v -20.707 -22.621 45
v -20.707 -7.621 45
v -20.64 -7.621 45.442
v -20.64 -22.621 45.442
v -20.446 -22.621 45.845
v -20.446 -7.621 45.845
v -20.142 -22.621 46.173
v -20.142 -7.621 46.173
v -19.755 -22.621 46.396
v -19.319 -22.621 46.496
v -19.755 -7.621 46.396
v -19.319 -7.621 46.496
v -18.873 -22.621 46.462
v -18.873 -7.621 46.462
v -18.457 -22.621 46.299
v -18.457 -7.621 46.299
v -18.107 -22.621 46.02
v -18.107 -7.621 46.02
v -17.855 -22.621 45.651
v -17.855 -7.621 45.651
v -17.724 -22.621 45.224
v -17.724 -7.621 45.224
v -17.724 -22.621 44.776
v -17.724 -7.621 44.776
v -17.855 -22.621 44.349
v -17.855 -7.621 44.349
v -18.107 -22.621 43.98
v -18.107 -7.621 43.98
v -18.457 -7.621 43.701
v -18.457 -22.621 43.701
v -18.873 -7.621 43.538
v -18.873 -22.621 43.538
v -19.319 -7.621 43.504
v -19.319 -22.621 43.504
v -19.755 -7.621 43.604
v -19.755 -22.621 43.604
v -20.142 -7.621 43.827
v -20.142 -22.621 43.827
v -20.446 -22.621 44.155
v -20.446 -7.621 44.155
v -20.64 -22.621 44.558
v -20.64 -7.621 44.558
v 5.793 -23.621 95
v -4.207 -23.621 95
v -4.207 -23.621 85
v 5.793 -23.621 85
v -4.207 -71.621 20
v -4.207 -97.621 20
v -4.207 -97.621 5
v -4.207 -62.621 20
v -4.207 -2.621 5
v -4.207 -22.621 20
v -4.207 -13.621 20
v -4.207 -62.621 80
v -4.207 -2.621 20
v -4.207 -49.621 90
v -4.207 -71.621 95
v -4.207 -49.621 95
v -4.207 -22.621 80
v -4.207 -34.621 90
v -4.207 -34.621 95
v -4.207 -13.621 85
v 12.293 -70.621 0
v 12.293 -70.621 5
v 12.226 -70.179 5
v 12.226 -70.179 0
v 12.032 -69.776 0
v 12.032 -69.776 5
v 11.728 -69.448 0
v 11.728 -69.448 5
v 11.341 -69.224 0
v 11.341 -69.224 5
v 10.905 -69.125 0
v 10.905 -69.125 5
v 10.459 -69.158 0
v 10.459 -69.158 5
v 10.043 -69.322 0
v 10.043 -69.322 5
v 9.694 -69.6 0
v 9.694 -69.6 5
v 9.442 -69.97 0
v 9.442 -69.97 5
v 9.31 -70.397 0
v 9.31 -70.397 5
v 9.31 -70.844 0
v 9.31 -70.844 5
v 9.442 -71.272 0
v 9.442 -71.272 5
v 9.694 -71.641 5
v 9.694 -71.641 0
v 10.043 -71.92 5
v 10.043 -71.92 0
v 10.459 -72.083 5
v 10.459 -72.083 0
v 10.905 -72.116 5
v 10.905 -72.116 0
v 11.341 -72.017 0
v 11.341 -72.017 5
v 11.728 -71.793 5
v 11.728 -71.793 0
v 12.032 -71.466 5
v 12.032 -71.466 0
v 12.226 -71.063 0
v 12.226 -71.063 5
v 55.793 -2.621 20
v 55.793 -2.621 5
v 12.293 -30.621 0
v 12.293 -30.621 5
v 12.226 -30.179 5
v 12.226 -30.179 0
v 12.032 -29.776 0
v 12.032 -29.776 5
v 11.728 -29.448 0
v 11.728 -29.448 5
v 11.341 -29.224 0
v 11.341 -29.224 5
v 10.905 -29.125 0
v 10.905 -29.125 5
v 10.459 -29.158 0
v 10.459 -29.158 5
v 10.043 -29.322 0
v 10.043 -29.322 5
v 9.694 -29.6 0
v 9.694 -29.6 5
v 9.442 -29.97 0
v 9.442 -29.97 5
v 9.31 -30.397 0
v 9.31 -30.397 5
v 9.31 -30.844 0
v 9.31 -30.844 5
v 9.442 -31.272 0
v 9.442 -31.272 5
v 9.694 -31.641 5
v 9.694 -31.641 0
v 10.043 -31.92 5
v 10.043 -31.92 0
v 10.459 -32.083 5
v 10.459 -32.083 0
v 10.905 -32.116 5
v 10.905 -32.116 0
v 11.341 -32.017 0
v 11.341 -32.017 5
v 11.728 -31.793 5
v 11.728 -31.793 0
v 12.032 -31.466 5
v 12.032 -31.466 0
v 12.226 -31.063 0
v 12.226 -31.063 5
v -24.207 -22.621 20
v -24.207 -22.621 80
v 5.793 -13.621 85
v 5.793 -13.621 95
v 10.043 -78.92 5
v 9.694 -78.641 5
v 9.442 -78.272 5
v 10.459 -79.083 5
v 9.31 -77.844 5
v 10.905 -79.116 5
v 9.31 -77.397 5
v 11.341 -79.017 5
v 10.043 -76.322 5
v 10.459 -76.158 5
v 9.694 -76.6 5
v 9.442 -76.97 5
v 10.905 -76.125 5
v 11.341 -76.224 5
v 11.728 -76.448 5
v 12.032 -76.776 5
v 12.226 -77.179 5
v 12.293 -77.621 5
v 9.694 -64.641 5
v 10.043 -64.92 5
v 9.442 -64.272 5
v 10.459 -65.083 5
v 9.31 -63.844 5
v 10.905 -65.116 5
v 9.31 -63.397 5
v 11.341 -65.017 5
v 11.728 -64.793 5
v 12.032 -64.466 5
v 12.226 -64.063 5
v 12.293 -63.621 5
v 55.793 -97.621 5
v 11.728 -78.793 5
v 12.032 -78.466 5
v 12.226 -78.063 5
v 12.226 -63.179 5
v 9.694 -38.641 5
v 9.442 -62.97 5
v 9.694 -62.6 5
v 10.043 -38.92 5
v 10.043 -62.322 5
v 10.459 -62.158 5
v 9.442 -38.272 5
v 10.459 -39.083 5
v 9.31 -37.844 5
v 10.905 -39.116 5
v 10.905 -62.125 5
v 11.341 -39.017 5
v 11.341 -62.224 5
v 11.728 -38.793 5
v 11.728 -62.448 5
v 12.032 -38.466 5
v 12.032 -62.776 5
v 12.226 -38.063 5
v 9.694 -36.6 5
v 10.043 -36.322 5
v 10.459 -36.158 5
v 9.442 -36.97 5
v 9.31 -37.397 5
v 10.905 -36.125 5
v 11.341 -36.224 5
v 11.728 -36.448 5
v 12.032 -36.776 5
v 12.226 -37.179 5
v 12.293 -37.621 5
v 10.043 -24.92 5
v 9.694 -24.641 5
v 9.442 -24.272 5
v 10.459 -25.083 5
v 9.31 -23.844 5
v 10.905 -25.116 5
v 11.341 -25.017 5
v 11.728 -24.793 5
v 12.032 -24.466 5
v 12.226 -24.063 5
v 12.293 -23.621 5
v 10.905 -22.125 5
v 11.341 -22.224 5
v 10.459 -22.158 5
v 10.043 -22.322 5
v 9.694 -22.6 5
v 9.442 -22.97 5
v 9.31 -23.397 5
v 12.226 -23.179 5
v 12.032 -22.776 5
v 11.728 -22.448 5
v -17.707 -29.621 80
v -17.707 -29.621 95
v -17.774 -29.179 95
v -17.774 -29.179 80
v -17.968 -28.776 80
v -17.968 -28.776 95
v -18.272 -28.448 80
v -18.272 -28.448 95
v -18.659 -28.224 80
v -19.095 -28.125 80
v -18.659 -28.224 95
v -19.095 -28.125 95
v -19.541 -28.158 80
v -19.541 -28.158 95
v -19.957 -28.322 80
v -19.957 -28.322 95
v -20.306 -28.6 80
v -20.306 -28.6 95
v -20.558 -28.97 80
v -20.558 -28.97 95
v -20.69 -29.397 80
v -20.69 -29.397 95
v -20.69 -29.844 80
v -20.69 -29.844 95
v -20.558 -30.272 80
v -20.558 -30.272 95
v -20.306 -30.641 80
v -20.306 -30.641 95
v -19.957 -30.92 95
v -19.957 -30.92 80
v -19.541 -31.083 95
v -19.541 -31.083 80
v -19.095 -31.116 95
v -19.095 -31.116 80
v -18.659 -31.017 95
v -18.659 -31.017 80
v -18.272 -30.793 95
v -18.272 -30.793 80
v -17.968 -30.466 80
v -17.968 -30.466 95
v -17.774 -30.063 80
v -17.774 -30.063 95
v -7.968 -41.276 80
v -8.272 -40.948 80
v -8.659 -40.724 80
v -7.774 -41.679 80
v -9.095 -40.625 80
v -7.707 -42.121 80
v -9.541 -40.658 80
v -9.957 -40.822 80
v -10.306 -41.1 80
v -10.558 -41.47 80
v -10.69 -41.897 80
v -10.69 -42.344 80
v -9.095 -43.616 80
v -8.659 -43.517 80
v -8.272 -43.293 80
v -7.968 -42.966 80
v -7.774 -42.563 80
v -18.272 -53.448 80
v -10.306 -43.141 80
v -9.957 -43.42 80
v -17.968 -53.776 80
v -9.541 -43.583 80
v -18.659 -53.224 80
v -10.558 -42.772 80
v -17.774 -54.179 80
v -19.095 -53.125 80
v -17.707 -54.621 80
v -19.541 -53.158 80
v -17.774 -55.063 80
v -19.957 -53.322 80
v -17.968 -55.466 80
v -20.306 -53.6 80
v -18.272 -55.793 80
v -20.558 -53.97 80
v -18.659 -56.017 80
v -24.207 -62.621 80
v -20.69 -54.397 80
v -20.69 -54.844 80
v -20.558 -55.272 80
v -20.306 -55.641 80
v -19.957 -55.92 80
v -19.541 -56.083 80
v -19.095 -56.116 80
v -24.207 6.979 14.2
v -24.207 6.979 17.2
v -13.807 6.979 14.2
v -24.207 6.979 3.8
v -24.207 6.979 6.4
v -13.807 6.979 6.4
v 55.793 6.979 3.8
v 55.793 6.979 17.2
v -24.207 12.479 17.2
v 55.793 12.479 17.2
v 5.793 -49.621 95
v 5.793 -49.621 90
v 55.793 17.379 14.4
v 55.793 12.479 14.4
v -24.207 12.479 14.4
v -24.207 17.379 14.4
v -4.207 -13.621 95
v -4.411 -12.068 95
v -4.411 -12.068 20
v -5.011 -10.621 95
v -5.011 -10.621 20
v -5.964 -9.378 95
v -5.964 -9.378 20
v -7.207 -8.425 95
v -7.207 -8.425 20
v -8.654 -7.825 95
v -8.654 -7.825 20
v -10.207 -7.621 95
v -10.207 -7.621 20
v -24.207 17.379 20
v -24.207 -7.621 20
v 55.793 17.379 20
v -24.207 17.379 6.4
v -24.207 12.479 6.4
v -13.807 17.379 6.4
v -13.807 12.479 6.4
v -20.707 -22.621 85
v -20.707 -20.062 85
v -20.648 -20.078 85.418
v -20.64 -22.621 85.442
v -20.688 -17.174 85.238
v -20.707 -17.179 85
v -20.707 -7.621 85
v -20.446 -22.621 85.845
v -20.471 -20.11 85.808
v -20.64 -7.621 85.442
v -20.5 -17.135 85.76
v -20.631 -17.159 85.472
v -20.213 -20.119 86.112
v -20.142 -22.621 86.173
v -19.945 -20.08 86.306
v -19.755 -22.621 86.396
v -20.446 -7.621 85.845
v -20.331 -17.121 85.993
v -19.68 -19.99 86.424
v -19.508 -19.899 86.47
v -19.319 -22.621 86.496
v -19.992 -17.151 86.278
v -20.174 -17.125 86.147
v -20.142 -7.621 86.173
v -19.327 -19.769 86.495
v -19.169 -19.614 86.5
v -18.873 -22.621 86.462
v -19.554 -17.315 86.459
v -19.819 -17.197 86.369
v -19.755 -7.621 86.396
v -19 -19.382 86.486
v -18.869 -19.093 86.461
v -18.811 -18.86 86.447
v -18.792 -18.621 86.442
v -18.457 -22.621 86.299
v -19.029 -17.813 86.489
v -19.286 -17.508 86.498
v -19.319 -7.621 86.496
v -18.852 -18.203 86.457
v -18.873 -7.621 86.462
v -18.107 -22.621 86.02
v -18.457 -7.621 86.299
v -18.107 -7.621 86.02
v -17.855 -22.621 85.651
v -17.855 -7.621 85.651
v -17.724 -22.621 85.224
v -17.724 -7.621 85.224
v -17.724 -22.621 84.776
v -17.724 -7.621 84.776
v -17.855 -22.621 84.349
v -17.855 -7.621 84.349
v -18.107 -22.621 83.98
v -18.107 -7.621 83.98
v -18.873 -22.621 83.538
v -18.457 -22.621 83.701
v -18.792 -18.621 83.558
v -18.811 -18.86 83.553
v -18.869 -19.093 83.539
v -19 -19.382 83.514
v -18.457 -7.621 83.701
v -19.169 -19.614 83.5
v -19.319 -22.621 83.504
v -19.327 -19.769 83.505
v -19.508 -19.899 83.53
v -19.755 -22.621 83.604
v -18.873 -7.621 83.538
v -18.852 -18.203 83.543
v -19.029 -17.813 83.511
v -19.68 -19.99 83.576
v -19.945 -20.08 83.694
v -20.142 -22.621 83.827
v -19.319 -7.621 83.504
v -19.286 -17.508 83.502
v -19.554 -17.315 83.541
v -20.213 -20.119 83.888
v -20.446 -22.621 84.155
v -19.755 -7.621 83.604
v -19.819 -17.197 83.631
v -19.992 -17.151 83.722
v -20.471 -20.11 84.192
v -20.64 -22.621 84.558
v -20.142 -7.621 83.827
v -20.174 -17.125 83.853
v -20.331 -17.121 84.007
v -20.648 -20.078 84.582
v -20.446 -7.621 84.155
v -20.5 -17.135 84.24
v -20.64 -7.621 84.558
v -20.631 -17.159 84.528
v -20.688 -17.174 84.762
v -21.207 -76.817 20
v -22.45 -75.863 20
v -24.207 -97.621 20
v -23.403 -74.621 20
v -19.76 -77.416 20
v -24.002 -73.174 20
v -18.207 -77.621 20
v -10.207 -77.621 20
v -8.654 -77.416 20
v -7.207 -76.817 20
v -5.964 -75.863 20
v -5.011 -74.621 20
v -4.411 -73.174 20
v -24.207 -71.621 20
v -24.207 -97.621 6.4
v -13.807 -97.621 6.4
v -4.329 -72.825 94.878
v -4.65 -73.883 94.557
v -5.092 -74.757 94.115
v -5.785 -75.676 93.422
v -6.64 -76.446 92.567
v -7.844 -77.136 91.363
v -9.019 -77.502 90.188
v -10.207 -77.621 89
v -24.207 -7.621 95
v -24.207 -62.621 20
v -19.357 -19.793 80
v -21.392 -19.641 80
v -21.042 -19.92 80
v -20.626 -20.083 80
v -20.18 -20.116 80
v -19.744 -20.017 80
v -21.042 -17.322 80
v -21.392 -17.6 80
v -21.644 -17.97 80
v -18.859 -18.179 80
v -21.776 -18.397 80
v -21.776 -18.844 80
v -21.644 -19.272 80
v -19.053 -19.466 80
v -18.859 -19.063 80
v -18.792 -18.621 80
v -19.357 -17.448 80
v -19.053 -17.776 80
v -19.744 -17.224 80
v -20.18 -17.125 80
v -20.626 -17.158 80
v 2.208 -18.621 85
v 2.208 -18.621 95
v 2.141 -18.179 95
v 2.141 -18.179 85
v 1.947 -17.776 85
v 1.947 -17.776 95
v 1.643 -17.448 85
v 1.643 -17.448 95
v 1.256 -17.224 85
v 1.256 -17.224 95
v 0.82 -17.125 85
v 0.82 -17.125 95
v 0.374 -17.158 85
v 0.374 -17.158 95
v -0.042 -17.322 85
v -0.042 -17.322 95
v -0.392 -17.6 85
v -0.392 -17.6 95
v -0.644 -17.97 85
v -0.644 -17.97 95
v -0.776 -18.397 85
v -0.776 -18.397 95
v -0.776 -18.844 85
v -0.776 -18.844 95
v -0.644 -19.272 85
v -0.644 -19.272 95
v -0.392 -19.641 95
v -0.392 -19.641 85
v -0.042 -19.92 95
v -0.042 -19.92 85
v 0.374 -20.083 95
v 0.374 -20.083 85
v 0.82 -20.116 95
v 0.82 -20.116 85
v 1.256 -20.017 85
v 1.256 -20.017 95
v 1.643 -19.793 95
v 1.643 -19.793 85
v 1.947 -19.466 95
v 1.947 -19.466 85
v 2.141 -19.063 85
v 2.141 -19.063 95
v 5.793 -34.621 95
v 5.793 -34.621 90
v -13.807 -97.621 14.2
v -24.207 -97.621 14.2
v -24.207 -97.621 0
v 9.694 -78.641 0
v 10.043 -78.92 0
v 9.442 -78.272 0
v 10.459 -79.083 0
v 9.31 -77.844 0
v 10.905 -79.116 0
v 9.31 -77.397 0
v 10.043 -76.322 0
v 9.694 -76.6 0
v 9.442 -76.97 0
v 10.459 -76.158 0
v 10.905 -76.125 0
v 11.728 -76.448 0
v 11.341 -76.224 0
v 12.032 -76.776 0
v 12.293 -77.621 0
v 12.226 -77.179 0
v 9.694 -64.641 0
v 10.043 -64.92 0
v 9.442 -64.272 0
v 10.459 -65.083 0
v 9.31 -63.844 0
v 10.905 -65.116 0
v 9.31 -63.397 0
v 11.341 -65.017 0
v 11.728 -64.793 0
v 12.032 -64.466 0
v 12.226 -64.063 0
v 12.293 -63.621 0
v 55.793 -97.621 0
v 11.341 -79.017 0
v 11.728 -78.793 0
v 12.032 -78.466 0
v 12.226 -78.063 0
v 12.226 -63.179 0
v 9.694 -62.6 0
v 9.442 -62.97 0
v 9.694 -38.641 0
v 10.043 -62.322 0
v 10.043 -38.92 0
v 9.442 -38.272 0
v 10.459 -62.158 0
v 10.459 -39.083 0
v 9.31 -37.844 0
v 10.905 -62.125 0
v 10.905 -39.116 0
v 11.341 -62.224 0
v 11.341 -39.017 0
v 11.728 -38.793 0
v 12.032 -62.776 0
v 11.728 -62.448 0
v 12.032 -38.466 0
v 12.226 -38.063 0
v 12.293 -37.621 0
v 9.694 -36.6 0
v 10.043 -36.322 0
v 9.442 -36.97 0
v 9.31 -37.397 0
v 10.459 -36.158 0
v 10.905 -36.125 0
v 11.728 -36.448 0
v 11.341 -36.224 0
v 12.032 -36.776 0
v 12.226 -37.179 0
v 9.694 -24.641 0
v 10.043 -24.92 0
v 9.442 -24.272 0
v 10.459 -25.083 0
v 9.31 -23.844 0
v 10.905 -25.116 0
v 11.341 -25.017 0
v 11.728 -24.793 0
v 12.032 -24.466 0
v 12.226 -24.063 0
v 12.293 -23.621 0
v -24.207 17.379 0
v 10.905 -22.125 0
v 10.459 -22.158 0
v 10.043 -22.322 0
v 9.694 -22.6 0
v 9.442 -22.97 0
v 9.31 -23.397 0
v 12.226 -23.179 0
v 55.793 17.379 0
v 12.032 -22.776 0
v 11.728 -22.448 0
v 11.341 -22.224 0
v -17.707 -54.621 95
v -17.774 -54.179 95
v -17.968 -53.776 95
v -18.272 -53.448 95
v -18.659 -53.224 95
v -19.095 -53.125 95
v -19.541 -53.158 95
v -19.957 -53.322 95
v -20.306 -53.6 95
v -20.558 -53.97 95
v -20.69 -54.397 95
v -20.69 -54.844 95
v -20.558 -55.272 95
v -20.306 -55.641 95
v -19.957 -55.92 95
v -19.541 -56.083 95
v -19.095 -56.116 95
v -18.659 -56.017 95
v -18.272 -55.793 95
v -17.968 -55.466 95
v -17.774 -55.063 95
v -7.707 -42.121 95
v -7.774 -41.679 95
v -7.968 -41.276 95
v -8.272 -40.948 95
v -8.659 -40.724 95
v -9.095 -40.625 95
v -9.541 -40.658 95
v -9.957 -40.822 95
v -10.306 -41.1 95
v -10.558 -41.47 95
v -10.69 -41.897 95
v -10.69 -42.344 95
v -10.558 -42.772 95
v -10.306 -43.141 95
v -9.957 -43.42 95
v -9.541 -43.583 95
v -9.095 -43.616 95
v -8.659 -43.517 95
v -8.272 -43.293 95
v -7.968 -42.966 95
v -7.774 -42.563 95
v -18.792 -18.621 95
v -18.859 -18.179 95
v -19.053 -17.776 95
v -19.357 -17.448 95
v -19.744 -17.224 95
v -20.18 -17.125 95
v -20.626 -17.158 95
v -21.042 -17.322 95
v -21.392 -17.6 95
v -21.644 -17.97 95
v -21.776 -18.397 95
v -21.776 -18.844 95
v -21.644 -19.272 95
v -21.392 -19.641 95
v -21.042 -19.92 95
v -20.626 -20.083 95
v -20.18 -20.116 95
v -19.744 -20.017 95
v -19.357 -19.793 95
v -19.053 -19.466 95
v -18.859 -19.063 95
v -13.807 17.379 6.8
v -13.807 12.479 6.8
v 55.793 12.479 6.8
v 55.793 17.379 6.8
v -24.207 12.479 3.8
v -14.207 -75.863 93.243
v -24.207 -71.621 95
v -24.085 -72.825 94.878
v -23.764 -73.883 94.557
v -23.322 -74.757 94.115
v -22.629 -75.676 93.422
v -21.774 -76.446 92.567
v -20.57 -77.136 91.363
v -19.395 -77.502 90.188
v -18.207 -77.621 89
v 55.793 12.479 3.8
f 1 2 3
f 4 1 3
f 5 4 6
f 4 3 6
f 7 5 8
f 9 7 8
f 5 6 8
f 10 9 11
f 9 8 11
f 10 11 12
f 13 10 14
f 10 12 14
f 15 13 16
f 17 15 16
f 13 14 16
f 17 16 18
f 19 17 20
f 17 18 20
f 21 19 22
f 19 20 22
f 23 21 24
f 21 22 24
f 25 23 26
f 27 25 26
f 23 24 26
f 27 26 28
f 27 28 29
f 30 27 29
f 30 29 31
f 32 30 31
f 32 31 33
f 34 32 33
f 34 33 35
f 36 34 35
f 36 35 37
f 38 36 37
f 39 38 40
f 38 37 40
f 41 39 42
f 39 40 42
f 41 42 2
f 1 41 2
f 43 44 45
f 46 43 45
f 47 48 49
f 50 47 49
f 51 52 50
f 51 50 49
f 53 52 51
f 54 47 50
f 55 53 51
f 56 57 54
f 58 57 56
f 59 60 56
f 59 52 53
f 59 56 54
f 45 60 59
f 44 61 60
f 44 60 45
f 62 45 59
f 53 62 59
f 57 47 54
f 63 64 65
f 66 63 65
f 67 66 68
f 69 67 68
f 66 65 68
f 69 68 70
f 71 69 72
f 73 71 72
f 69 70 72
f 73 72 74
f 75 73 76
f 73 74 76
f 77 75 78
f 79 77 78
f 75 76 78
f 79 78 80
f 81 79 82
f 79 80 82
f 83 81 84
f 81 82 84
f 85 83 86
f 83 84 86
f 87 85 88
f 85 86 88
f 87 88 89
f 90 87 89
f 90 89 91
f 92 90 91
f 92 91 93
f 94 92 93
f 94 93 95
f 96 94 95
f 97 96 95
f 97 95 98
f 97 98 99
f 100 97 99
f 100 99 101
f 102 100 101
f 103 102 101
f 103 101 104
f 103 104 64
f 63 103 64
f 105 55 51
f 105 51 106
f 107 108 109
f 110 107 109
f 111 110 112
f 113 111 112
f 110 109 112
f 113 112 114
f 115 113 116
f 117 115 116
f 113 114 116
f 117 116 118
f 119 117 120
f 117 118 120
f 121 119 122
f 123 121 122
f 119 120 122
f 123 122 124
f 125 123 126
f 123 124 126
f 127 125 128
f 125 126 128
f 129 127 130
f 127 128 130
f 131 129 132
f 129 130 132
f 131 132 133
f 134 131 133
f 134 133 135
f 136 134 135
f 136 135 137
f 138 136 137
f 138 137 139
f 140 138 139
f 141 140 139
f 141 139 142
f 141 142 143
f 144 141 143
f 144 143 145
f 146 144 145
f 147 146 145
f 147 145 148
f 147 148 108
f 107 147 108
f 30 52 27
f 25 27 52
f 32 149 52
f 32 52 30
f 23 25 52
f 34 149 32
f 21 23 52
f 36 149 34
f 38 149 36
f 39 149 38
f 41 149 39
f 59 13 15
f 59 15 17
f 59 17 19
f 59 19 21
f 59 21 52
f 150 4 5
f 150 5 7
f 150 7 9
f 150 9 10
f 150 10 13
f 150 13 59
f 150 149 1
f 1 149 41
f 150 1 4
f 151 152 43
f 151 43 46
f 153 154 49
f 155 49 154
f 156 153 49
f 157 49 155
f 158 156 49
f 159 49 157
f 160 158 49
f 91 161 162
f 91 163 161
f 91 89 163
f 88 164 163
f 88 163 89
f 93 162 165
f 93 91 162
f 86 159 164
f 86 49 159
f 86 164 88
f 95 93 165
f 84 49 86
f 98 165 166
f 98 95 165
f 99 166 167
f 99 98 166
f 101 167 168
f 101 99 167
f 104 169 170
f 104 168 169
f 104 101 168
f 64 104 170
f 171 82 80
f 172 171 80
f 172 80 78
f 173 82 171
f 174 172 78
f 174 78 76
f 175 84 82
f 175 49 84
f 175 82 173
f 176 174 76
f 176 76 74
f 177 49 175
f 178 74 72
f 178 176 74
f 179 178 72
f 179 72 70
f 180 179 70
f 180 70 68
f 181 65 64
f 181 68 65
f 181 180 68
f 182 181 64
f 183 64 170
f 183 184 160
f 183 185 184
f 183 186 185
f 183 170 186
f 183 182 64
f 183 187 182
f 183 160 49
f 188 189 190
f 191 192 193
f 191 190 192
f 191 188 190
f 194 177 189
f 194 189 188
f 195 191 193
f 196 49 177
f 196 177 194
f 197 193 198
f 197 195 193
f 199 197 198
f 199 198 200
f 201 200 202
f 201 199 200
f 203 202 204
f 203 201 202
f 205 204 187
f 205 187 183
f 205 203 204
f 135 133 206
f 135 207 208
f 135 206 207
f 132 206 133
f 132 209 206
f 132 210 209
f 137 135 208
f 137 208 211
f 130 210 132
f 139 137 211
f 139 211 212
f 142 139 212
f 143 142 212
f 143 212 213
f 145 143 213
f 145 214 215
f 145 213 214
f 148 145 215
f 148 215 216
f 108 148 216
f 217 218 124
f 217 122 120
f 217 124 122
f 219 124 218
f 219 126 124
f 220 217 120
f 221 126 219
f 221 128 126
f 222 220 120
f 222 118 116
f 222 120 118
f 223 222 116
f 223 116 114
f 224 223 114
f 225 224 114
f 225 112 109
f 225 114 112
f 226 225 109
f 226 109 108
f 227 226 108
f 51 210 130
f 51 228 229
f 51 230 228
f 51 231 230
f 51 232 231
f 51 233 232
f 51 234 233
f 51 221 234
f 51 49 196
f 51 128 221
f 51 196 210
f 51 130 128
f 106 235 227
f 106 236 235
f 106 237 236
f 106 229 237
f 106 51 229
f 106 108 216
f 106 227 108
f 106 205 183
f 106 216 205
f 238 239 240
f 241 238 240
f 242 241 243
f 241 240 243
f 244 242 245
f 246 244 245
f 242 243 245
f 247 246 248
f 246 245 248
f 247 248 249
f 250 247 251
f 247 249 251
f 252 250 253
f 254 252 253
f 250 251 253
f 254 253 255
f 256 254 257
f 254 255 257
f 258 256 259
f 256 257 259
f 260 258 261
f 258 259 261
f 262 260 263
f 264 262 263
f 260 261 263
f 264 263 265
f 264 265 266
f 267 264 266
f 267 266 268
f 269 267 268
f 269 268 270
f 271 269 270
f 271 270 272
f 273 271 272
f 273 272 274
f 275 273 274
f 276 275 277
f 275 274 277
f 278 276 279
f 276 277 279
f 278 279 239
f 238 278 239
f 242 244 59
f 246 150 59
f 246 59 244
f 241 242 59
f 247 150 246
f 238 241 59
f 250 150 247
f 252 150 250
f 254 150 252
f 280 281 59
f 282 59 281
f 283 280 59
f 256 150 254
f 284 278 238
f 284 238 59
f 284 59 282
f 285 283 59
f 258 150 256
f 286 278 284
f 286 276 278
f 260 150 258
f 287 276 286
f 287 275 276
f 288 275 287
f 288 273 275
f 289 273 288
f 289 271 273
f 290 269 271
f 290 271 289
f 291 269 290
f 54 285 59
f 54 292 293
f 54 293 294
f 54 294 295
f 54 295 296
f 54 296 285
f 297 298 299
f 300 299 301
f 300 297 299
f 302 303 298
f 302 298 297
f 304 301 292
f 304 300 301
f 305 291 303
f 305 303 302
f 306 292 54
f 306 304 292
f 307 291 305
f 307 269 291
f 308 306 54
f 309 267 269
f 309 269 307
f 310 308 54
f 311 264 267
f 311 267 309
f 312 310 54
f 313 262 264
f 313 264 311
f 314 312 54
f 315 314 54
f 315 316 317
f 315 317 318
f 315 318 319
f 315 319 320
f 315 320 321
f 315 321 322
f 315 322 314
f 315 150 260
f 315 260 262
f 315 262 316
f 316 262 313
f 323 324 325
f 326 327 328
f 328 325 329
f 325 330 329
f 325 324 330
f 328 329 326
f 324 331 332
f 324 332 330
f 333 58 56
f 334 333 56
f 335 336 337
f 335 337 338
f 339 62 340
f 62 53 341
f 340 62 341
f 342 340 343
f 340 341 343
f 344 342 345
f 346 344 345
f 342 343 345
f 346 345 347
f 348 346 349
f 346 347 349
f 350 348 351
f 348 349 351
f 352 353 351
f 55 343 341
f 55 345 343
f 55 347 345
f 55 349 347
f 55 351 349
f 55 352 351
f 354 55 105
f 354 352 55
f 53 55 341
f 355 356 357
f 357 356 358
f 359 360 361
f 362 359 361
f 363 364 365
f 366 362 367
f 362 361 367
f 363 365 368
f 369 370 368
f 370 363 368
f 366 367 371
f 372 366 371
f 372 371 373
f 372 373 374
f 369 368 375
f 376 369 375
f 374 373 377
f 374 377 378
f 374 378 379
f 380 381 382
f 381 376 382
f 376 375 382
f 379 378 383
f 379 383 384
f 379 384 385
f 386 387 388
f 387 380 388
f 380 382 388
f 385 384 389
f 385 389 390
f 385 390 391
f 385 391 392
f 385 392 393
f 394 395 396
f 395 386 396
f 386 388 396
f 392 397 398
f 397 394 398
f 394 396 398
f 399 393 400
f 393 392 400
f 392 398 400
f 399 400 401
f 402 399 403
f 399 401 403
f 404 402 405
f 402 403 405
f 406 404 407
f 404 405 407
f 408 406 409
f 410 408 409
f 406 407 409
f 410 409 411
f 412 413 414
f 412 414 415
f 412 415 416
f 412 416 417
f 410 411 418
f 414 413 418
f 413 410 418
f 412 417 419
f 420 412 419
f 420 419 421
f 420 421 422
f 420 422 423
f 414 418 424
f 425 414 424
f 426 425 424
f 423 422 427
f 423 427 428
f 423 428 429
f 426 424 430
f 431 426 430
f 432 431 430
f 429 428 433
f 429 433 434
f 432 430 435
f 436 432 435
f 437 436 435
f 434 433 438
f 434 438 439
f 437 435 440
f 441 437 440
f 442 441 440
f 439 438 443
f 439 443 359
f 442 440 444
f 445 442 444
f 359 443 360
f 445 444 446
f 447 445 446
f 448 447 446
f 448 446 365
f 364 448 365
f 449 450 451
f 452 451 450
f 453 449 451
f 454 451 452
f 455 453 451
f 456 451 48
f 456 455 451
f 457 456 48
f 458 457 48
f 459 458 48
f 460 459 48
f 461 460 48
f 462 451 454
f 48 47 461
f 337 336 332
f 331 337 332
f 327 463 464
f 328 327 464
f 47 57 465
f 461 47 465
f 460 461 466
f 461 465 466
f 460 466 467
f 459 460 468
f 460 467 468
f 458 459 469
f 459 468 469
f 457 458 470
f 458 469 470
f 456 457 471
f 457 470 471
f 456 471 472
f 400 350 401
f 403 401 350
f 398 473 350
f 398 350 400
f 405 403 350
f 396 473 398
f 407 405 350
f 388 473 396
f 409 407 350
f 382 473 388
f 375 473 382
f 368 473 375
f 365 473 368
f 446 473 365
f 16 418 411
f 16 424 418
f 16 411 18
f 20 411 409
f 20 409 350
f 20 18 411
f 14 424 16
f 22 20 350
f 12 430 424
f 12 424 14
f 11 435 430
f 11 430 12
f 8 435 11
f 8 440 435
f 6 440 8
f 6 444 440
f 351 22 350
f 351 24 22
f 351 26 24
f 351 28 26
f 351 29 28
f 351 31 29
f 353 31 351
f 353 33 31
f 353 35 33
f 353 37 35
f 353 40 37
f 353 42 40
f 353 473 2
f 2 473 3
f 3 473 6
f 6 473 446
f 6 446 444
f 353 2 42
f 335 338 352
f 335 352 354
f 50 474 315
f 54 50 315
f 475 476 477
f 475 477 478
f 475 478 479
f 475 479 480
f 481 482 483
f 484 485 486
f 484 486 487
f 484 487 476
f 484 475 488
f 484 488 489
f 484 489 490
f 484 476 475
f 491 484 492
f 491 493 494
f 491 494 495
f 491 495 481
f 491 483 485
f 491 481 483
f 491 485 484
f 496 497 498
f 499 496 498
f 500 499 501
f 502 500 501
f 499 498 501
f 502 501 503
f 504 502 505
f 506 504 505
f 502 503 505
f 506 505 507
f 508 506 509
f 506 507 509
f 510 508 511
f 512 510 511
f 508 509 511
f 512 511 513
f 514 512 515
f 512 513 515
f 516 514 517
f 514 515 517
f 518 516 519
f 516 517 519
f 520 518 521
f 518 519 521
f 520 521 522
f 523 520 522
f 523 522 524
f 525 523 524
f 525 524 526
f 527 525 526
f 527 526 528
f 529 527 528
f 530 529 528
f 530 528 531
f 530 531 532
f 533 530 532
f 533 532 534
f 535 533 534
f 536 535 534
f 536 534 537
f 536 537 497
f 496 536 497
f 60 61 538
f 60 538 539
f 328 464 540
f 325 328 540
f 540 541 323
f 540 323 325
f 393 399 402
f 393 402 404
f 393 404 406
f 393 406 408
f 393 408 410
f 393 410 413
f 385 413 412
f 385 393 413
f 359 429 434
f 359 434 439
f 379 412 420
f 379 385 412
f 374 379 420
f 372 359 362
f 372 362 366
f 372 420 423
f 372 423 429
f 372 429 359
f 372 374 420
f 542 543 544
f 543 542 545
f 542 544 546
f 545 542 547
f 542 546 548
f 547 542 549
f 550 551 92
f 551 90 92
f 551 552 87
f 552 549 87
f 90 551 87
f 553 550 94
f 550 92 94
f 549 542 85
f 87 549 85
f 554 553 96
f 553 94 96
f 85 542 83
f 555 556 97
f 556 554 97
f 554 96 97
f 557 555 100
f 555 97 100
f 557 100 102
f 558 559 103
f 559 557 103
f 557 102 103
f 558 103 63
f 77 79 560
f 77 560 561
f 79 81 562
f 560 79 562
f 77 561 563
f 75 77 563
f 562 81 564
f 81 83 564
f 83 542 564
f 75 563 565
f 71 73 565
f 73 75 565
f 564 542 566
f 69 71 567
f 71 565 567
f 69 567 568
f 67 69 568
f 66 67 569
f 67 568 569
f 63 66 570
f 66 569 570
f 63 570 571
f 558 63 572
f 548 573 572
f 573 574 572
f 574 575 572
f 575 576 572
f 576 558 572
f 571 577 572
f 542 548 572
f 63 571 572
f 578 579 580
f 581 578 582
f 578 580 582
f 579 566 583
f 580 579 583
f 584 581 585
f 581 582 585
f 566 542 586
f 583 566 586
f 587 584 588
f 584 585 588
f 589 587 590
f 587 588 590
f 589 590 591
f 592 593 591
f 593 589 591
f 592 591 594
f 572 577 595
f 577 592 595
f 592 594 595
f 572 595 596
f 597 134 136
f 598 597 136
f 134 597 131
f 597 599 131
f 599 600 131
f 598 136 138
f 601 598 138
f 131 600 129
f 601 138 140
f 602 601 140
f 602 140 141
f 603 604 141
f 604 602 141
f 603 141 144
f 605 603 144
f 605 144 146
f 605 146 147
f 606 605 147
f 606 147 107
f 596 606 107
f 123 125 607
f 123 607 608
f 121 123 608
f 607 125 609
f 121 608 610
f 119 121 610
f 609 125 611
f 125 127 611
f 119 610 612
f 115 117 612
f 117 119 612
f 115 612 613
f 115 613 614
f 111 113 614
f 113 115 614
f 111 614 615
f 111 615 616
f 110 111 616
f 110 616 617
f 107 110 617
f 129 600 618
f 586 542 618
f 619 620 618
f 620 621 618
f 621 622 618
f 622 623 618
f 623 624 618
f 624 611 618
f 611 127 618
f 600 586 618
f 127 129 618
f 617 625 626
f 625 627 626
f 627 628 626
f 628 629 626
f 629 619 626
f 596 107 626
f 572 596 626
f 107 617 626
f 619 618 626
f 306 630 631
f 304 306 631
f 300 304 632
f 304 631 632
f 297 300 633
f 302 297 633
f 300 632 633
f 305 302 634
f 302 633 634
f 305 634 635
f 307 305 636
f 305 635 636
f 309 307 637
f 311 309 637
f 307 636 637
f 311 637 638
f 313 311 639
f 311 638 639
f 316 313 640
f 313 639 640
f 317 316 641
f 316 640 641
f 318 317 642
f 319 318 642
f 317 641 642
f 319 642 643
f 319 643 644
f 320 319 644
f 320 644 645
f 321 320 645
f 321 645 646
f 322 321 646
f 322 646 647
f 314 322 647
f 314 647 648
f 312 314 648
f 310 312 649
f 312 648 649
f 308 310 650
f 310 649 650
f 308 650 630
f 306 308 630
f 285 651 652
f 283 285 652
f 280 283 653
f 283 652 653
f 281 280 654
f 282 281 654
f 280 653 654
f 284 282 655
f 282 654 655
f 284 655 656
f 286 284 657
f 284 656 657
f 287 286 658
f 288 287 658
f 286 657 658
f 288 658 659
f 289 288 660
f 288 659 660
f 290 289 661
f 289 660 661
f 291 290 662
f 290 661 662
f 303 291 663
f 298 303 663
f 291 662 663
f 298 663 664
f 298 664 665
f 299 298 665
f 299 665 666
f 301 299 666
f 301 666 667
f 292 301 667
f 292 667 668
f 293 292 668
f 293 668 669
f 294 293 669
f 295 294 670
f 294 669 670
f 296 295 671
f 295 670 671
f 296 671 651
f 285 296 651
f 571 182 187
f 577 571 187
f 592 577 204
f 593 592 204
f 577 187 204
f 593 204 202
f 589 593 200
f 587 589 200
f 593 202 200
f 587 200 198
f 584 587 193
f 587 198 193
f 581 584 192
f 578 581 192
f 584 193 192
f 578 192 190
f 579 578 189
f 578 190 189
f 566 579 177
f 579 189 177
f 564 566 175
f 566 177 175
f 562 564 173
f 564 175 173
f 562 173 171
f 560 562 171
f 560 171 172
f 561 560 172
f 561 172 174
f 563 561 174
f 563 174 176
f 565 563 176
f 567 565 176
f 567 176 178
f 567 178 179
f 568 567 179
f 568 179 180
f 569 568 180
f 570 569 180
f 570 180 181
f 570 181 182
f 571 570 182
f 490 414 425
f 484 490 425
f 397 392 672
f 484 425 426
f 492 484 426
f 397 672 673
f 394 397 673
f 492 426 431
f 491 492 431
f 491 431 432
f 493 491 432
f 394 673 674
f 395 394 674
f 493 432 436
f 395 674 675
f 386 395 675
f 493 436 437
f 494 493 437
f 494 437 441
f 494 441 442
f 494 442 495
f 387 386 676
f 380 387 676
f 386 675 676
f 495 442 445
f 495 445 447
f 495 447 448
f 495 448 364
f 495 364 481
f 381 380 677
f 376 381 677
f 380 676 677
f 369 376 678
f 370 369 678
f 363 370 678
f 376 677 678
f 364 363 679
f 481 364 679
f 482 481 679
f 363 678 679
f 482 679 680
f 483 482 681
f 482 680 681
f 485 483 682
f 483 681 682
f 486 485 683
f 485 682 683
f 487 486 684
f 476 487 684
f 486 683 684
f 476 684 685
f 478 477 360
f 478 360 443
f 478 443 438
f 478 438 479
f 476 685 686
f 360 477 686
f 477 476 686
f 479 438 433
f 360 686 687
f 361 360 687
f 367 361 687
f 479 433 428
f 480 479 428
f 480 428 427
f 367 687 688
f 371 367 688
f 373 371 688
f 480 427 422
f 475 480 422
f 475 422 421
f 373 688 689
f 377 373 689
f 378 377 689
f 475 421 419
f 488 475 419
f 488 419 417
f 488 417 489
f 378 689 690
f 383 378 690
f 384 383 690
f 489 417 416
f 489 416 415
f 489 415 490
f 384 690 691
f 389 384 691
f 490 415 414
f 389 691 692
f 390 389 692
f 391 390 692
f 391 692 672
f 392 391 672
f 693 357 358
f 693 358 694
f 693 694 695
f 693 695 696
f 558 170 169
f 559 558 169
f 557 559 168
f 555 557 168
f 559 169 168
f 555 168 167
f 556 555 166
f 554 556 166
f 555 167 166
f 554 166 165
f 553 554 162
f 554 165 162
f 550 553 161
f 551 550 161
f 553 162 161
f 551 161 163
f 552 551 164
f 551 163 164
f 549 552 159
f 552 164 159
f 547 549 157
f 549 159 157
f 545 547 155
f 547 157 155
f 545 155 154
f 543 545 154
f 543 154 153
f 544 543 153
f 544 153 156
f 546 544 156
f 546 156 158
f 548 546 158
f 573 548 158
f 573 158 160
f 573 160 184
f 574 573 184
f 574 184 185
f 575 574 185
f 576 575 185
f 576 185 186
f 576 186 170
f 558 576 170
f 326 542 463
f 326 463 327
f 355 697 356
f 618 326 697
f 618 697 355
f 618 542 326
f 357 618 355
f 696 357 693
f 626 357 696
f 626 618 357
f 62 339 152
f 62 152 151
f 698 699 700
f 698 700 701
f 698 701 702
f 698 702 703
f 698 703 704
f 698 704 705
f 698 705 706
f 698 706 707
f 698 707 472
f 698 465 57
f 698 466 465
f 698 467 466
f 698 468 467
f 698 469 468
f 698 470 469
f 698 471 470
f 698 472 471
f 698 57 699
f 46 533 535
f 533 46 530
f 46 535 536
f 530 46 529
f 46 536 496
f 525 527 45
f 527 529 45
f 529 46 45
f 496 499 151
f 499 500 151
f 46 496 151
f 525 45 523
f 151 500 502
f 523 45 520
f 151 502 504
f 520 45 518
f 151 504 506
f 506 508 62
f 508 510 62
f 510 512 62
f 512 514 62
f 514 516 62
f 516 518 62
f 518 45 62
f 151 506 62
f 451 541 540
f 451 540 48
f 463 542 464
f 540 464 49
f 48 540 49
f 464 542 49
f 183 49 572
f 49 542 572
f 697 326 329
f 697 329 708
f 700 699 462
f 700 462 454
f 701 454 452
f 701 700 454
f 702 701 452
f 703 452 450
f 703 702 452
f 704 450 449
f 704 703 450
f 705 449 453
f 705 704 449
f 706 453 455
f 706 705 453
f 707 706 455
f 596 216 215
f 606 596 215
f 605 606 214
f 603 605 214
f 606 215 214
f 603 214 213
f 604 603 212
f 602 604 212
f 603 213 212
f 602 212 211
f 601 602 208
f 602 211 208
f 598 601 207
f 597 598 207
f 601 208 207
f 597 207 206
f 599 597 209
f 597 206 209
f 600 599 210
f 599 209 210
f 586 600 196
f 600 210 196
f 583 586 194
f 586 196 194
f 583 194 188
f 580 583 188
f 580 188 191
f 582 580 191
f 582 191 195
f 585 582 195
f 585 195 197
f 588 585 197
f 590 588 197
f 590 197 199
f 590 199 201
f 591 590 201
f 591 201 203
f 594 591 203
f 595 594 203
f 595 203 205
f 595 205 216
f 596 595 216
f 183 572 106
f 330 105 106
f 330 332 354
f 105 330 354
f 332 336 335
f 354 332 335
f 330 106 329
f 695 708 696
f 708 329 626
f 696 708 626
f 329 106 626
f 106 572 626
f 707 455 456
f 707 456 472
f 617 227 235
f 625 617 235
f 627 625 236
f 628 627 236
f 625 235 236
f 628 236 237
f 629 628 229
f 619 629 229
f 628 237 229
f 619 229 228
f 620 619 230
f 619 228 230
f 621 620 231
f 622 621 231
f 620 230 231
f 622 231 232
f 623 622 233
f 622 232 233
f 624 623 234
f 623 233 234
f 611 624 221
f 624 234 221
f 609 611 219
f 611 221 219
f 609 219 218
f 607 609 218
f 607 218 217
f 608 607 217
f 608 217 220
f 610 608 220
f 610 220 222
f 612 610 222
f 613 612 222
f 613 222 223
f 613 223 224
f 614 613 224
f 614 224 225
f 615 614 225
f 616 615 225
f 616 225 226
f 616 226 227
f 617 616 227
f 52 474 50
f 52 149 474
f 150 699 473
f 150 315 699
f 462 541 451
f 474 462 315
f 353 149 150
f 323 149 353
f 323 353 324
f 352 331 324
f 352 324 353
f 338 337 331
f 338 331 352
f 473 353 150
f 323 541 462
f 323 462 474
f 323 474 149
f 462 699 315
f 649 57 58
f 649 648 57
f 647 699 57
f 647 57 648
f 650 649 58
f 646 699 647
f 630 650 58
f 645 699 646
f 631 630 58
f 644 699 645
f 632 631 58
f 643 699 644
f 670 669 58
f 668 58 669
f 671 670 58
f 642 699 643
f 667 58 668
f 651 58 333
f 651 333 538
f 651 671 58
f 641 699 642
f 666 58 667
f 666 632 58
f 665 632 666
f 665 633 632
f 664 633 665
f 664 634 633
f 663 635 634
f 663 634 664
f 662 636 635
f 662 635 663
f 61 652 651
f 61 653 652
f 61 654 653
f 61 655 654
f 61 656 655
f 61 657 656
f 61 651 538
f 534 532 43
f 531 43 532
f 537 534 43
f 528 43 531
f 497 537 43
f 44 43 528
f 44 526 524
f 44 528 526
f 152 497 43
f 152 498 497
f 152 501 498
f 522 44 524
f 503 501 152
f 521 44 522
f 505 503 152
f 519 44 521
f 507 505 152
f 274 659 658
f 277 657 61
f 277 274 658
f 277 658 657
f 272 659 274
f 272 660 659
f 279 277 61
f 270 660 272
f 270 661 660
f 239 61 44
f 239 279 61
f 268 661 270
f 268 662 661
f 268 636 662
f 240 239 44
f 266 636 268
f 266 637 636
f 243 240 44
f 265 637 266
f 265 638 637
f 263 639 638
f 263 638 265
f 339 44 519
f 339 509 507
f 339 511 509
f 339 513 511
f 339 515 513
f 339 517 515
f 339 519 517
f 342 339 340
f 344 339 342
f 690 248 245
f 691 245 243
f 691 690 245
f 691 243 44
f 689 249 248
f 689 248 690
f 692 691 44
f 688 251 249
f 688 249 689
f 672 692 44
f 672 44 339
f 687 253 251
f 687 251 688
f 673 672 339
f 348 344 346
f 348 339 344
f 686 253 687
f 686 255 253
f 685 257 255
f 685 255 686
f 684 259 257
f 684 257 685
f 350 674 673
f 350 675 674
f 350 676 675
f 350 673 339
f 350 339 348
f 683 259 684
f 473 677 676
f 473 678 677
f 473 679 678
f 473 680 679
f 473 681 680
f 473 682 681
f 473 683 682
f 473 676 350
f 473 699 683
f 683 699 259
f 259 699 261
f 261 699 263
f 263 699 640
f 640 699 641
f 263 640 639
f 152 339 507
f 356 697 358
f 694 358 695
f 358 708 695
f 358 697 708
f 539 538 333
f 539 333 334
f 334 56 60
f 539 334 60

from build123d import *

# Parameters (mm, degrees)
SKETCH1_W           = 80
SKETCH1_H           = 115
BOSS_EXTRUDE1_DEPTH = 20
SKETCH2_W           = 60
SKETCH2_H           = 15
BOSS_EXTRUDE2_DEPTH = 20
SKETCH4_W           = 10
SKETCH4_H           = 10
SKETCH4_W_2         = 5
SKETCH4_H_2         = 15
BOSS_EXTRUDE3_DEPTH = 10
SKETCH3_R           = 1.5
CUT_EXTRUDE1_DEPTH  = 15
SKETCH6_R           = 1.5
CUT_EXTRUDE3_DEPTH  = 15
SKETCH7_R           = 1.5
CUT_EXTRUDE4_DEPTH  = 136.157942631
SKETCH8_W           = 60
SKETCH8_H           = 95
CUT_EXTRUDE5_DEPTH  = 15
SKETCH9_W           = 7.6
SKETCH9_H           = 4.9
CUT_EXTRUDE6_DEPTH  = 158.970880442
SKETCH10_W          = 10.4
SKETCH10_H          = 7.8
CUT_EXTRUDE7_DEPTH  = 160.257246025
FILLET1_R           = 6
FILLET2_R           = 6
FILLET3_R           = 6
FILLET4_START       = -25
FILLET4_DEPTH       = 22


with BuildPart() as part:
    # Sketch1 → Boss-Extrude1 (new body)
    with BuildSketch(Plane.XY):
        with Locations((15.793103448, -40.120689655)):
            Rectangle(SKETCH1_W, SKETCH1_H)
    extrude(amount=BOSS_EXTRUDE1_DEPTH)

    # Sketch2 → Boss-Extrude2 (add)
    with BuildSketch(Plane.ZY.offset(24.206896552)):
        with Locations((50, -15.120689655)):
            Rectangle(SKETCH2_W, SKETCH2_H)
        Polygon((80, -7.620689655), (80, -22.620689655), (80, -62.620689655), (80, -77.620689655), (95, -77.620689655), (95, -7.620689655), align=None)
        with Locations((50, -70.120689655)):
            Rectangle(SKETCH2_W, SKETCH2_H)
    extrude(amount=-BOSS_EXTRUDE2_DEPTH)

    # Sketch4 → Boss-Extrude3 (add)
    with BuildSketch(Plane(origin=(-4.206896552, 0, 0), x_dir=(0, 0, -1), z_dir=(1, 0, 0))):
        with Locations((-90, -18.620689655)):
            Rectangle(SKETCH4_W, SKETCH4_H)
        with Locations((-92.5, -42.120689655)):
            Rectangle(SKETCH4_W_2, SKETCH4_H_2)
    extrude(amount=BOSS_EXTRUDE3_DEPTH)

    # Sketch3 → Cut-Extrude1 (cut)
    with BuildSketch(Plane.XY.offset(95)):
        with Locations((0.707744923, -18.620689655)):
            Circle(SKETCH3_R)
        with Locations((-20.292255077, -18.620689655)):
            Circle(SKETCH3_R)
        with Locations((-19.206896552, -29.620689655)):
            Circle(SKETCH3_R)
        with Locations((-19.206896552, -54.620689655)):
            Circle(SKETCH3_R)
        with Locations((-9.206896552, -42.120689655)):
            Circle(SKETCH3_R)
    extrude(amount=-CUT_EXTRUDE1_DEPTH, mode=Mode.SUBTRACT)

    # Sketch6 → Cut-Extrude3 (cut)
    with BuildSketch(Plane(origin=(0, -7.620689655, 0), x_dir=(1, 0, 0), z_dir=(0, 1, 0))):
        with Locations(Location((-19.206896552, -85, 0), (0, 0, 180))):
            Circle(SKETCH6_R)
        with Locations(Location((-19.206896552, -45, 0), (0, 0, 180))):
            Circle(SKETCH6_R)
    extrude(amount=-CUT_EXTRUDE3_DEPTH, mode=Mode.SUBTRACT)

    # Sketch7 → Cut-Extrude4 (cut, through all)
    with BuildSketch(Plane.XY.offset(20)):
        with Locations((10.793103448, -77.620689655)):
            Circle(SKETCH7_R)
        with Locations((10.793103448, -37.620689655)):
            Circle(SKETCH7_R)
        with Locations((10.793103448, -70.620689655)):
            Circle(SKETCH7_R)
        with Locations((10.793103448, -30.620689655)):
            Circle(SKETCH7_R)
        with Locations((10.793103448, -63.620689655)):
            Circle(SKETCH7_R)
        with Locations((10.793103448, -23.620689655)):
            Circle(SKETCH7_R)
    extrude(amount=-CUT_EXTRUDE4_DEPTH, mode=Mode.SUBTRACT)

    # Sketch8 → Cut-Extrude5 (cut)
    with BuildSketch(Plane.XY.offset(20)):
        with Locations((25.793103448, -50.120689655)):
            Rectangle(SKETCH8_W, SKETCH8_H)
    extrude(amount=-CUT_EXTRUDE5_DEPTH, mode=Mode.SUBTRACT)

    # Sketch9 → Cut-Extrude6 (cut, through all)
    with BuildSketch(Plane(origin=(55.793103448, 0, 0), x_dir=(0, 0, -1), z_dir=(1, 0, 0))):
        Polygon((-6.8, 12.479310345), (-14.4, 12.479310345), (-17.2, 12.479310345), (-17.2, 6.979310345), (-3.8, 6.979310345), (-3.8, 12.479310345), align=None)
        with Locations((-10.6, 14.929310345)):
            Rectangle(SKETCH9_W, SKETCH9_H)
    extrude(amount=-CUT_EXTRUDE6_DEPTH, mode=Mode.SUBTRACT)

    # Sketch10 → Cut-Extrude7 (cut, through all)
    with BuildSketch(Plane.XZ.offset(97.620689655)):
        with Locations((-19.006896552, 10.3)):
            Rectangle(SKETCH10_W, SKETCH10_H)
    extrude(amount=-CUT_EXTRUDE7_DEPTH, mode=Mode.SUBTRACT)

    # Fillet1
    fillet1_edges = [part.edges().sort_by_distance(p)[0] for p in [
        (-24.206896552, -77.620689655, 57.5),
    ]]
    fillet(fillet1_edges, radius=FILLET1_R)

    # Fillet2
    fillet2_edges = [part.edges().sort_by_distance(p)[0] for p in [
        (-4.206896552, -77.620689655, 57.5),
    ]]
    fillet(fillet2_edges, radius=FILLET2_R)

    # Fillet3
    fillet3_edges = [part.edges().sort_by_distance(p)[0] for p in [
        (-4.206896552, -7.620689655, 57.5),
    ]]
    fillet(fillet3_edges, radius=FILLET3_R)

    # Fillet4: read off the stored shape, not the designer's step
    # Fillet4 outline → Fillet4 (cut)
    with BuildSketch(Plane.YZ.offset(FILLET4_START)):
        with BuildLine():
            Line((-77.620689655, 95), (-77.620689655, 89))
            add(Edge.make_bspline(
                [(-77.620689655, 89), (-77.620689655, 95), (-71.620689655, 95)],
                knots=[0, 0, 0, 1, 1, 1], degree=2, weights=[1, 0.707106781, 1]))
            Line((-71.620689655, 95), (-77.620689655, 95))
        make_face()
    extrude(amount=FILLET4_DEPTH, mode=Mode.SUBTRACT)


solid = part.part
